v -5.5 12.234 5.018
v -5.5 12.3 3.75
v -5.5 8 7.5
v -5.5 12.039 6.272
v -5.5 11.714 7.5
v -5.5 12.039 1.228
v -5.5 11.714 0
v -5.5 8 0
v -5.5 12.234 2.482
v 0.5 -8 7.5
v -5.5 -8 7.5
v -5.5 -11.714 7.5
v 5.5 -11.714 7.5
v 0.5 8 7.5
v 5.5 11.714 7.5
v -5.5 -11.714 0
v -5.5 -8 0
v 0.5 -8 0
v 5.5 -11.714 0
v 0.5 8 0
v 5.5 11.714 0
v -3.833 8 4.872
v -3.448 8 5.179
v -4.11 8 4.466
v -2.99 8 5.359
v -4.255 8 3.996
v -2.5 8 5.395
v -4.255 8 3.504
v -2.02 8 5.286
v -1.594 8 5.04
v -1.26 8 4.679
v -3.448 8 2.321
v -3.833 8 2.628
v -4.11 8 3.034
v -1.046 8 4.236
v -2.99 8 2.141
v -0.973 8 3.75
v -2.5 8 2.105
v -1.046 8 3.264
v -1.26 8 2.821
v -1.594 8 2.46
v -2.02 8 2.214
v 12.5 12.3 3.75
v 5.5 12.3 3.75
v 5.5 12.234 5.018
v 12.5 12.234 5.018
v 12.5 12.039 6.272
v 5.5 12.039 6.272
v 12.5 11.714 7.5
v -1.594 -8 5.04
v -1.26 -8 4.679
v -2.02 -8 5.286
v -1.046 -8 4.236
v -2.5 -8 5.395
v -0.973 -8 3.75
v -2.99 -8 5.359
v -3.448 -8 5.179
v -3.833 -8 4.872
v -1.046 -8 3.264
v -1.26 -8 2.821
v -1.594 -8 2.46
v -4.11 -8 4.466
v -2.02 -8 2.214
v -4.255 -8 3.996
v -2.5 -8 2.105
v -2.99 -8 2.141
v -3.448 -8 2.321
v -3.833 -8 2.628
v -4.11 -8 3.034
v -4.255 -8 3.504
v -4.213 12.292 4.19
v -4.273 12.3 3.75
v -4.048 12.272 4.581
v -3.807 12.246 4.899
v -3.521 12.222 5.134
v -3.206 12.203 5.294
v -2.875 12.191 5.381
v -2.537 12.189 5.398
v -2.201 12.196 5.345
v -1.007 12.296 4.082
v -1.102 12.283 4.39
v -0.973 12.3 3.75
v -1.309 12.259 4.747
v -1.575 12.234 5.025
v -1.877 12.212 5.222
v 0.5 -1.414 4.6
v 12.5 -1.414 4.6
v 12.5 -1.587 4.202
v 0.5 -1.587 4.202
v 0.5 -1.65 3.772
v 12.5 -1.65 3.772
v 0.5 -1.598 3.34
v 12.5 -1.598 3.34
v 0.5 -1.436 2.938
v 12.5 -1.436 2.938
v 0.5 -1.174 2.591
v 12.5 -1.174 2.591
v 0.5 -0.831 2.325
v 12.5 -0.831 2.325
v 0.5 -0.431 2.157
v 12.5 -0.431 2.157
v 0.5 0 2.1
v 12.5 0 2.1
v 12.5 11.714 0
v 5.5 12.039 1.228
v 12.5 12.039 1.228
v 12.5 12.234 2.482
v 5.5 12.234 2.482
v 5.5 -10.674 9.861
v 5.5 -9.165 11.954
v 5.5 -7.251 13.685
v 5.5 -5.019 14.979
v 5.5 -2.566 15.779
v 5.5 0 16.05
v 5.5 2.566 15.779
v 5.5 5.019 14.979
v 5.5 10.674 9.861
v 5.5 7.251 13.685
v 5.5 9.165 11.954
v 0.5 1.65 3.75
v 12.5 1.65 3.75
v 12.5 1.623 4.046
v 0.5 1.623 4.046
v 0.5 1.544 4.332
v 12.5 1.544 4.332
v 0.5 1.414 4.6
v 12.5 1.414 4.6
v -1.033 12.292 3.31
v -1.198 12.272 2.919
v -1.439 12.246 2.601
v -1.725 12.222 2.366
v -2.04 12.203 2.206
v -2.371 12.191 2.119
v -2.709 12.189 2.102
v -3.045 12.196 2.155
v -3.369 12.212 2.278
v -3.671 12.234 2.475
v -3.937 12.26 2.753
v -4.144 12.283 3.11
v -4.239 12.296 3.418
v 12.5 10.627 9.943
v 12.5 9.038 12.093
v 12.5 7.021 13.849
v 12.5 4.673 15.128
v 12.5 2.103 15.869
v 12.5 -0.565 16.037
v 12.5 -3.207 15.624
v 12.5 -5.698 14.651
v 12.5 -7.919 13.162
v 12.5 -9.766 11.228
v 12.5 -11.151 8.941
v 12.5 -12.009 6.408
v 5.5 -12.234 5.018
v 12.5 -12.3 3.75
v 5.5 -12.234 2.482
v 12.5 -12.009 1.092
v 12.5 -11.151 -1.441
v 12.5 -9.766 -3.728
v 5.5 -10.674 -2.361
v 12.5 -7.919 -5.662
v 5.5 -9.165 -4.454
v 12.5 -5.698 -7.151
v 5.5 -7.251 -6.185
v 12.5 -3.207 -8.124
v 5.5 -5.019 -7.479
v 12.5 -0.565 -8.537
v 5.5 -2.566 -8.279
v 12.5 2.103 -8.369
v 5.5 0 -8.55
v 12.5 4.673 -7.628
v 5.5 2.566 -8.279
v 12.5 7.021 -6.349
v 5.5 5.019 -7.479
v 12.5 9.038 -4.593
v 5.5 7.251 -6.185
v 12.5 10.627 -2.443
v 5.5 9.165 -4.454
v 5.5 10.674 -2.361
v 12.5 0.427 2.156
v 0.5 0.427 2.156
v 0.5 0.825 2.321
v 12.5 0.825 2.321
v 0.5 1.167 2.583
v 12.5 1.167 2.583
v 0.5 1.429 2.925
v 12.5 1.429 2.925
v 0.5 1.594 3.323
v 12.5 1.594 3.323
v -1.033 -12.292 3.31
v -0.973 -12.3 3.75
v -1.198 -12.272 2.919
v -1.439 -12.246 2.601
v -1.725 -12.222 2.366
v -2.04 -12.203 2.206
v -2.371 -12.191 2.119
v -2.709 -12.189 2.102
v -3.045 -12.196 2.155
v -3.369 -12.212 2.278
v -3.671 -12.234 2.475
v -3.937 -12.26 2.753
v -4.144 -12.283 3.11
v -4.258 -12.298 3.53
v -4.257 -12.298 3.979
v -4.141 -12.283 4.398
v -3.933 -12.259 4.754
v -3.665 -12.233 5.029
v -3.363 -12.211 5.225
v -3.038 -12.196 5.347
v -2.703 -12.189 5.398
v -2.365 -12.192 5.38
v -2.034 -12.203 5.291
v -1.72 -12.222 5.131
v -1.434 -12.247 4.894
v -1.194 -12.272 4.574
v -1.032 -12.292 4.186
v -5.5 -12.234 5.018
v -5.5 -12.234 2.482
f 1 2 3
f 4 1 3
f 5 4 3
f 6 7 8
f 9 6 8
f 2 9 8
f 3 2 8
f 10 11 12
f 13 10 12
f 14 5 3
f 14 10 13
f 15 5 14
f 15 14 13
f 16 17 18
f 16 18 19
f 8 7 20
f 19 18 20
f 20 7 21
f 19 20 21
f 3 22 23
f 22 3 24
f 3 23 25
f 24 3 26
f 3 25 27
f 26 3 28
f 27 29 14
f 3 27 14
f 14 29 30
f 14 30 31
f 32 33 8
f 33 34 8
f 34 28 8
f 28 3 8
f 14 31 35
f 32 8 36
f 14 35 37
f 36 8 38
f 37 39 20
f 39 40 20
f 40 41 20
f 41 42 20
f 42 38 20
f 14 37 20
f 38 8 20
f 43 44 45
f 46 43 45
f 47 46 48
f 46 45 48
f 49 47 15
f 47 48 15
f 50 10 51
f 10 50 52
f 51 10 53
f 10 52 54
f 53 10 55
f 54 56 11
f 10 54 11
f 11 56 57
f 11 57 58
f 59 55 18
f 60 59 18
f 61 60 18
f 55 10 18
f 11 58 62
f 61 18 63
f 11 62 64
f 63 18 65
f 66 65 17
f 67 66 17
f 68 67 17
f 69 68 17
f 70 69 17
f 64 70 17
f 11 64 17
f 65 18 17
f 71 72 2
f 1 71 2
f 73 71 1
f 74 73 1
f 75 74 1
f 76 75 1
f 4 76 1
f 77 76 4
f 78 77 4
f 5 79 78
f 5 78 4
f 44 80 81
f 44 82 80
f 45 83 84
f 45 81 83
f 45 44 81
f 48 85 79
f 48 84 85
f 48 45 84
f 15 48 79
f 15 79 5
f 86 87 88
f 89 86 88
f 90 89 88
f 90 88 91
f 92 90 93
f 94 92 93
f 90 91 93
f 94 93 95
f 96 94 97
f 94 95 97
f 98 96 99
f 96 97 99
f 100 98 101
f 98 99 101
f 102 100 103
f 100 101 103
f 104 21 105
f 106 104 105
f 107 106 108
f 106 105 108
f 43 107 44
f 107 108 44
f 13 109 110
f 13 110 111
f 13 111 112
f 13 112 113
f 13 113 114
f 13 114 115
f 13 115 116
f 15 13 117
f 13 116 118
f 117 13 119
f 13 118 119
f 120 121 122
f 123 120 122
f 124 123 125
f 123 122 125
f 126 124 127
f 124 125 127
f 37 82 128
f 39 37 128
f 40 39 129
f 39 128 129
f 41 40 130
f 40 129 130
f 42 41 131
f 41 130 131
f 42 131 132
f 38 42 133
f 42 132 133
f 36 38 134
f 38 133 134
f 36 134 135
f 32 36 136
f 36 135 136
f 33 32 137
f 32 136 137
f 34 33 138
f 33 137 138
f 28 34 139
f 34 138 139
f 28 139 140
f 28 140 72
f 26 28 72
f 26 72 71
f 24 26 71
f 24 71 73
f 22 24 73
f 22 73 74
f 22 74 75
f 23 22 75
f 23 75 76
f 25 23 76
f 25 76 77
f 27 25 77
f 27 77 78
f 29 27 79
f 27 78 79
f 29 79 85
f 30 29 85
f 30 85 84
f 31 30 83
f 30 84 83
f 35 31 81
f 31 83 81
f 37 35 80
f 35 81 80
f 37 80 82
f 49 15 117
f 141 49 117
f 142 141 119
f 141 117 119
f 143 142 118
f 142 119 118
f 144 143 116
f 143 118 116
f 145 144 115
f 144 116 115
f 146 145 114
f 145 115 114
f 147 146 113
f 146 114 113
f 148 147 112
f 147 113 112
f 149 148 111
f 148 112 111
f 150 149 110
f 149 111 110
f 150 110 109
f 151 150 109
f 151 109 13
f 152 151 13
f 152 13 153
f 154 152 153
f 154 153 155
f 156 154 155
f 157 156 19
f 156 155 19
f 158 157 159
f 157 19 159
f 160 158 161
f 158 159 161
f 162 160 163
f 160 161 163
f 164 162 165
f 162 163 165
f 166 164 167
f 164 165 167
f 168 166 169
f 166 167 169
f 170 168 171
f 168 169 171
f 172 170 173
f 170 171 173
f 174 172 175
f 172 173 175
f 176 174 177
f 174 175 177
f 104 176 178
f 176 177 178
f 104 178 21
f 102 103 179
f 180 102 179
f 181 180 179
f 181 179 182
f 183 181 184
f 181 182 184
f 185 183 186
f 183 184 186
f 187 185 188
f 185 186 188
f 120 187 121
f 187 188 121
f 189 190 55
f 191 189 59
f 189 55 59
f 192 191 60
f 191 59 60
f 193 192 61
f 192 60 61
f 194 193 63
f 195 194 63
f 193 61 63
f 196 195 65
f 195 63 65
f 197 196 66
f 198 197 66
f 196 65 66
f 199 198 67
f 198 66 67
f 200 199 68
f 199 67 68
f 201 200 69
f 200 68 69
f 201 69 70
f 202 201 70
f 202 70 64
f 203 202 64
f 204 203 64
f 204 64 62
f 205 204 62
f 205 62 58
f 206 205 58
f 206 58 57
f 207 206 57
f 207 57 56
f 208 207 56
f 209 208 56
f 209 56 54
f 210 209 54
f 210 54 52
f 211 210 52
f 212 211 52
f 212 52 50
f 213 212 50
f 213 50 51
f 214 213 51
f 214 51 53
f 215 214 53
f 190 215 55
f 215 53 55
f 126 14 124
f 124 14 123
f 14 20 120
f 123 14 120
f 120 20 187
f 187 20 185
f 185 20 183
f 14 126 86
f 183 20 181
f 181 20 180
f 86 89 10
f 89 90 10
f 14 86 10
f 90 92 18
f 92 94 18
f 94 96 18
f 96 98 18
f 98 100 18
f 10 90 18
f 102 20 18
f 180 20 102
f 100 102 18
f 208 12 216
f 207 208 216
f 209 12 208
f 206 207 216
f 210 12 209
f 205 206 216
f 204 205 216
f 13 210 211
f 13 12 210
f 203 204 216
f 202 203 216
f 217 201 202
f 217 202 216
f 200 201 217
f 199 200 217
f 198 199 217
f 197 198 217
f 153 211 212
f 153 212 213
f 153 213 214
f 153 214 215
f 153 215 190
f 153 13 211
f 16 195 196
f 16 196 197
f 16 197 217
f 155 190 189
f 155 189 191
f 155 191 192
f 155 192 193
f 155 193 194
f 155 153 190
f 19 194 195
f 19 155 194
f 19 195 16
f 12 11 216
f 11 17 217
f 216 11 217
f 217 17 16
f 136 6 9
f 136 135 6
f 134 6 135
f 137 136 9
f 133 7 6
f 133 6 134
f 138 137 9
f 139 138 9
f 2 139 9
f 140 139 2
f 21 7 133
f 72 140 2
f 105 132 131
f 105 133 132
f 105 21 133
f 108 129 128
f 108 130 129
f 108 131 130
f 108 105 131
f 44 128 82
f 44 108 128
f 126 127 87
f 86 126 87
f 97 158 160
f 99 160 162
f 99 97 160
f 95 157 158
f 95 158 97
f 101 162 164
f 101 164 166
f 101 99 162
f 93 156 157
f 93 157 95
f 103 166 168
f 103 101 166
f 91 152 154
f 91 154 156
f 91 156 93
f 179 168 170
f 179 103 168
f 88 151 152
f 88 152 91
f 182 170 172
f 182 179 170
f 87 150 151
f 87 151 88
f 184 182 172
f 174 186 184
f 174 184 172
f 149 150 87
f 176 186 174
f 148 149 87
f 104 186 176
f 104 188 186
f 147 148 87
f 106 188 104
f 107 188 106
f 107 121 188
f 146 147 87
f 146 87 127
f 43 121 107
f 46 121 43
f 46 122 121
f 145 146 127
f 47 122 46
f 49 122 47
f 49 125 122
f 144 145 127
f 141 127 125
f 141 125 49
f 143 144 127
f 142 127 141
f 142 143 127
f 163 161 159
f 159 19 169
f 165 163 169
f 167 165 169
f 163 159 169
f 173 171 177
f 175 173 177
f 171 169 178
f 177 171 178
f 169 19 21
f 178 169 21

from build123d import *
from build123d import SkipClean  # not in build123d's __all__

# Parameters (mm, degrees)
F1_DEPTH = 7.5
F3_DEPTH = 25.001
F5_DEPTH = 7
F7_DEPTH = 25
F8_R     = 14.6869623893
F8_R_2   = 12.3
F9_DEPTH = 25


with BuildPart() as f1:
    # F0 (on Top) → F1 (new body)
    with BuildSketch(Plane.XY):
        Polygon((5.5, -12.5), (5.5, 12.5), (-5.5, 12.5), (-5.5, 8), (0.5, 8), (0.5, -8), (-5.5, -8), (-5.5, -12.5), align=None)
    extrude(amount=F1_DEPTH)

    # F2 (on face) → F3 (cut, through all)
    with BuildSketch(Plane(origin=(0, 12.5, 0), x_dir=(-1, 0, 0), z_dir=(0, 1, 0))):
        with BuildLine():
            ThreePointArc((4.273, 3.75), (2.623, 5.4), (0.973, 3.75))
            Line((0.973, 3.75), (4.273, 3.75))
        make_face()
        with BuildLine():
            Line((4.273, 3.75), (0.973, 3.75))
            ThreePointArc((0.973, 3.75), (2.623, 2.1), (4.273, 3.75))
        make_face()
    extrude(amount=-F3_DEPTH, mode=Mode.SUBTRACT)

    # F4 (on face) → F5 (join)
    with BuildSketch(Plane.YZ.offset(5.5)):
        with BuildLine():
            Line((-11.7144141979, 7.5), (0, 7.5))
            Line((0, 7.5), (11.7144141979, 7.5))
            ThreePointArc((11.7144141979, 7.5), (0, 16.05), (-11.7144141979, 7.5))
        make_face()
        with BuildLine():
            Line((0, 0), (0, 7.5))
            Line((0, 7.5), (-11.7144141979, 7.5))
            ThreePointArc((-11.7144141979, 7.5), (-12.3, 3.75), (-11.7144141979, 0))
            Line((-11.7144141979, 0), (0, 0))
        make_face()
        with BuildLine():
            Line((11.7144141979, 0), (0, 0))
            Line((0, 0), (-11.7144141979, 0))
            ThreePointArc((-11.7144141979, 0), (0, -8.55), (11.7144141979, 0))
        make_face()
        with BuildLine():
            Line((11.7144141979, 7.5), (0, 7.5))
            Line((0, 7.5), (0, 0))
            Line((0, 0), (11.7144141979, 0))
            ThreePointArc((11.7144141979, 0), (12.1527218069, 1.8522769741), (12.3, 3.75))
            ThreePointArc((12.3, 3.75), (12.1527218069, 5.6477230259), (11.7144141979, 7.5))
        make_face()
    extrude(amount=F5_DEPTH)

    # F6 (on face) → F7 (cut)
    with BuildSketch(Plane.YZ.offset(12.5)):
        with BuildLine():
            Line((0, 2.1), (0, 4.6))
            Line((0, 4.6), (-1.4142135624, 4.6))
            ThreePointArc((-1.4142135624, 4.6), (-1.4361406616, 2.9375961595), (0, 2.1))
        make_face()
        with BuildLine():
            Line((1.4142135624, 4.6), (0, 4.6))
            Line((0, 4.6), (0, 2.1))
            ThreePointArc((0, 2.1), (1.166726189, 2.583273811), (1.65, 3.75))
            ThreePointArc((1.65, 3.75), (1.5899610652, 4.1910485359), (1.4142135624, 4.6))
        make_face()
    extrude(amount=-F7_DEPTH, mode=Mode.SUBTRACT)

    # F8 (on face) → F9 (cut)
    with BuildSketch(Plane.YZ.offset(12.5)):
        with Locations((0, 3.75)):
            Circle(F8_R)
        with Locations((0, 3.75)):
            Circle(F8_R_2, mode=Mode.SUBTRACT)
    with SkipClean():  # cleaning this boolean's faces spoils the solid; the shape is the same uncleaned
        extrude(amount=-F9_DEPTH, mode=Mode.SUBTRACT)


solid = f1.part
